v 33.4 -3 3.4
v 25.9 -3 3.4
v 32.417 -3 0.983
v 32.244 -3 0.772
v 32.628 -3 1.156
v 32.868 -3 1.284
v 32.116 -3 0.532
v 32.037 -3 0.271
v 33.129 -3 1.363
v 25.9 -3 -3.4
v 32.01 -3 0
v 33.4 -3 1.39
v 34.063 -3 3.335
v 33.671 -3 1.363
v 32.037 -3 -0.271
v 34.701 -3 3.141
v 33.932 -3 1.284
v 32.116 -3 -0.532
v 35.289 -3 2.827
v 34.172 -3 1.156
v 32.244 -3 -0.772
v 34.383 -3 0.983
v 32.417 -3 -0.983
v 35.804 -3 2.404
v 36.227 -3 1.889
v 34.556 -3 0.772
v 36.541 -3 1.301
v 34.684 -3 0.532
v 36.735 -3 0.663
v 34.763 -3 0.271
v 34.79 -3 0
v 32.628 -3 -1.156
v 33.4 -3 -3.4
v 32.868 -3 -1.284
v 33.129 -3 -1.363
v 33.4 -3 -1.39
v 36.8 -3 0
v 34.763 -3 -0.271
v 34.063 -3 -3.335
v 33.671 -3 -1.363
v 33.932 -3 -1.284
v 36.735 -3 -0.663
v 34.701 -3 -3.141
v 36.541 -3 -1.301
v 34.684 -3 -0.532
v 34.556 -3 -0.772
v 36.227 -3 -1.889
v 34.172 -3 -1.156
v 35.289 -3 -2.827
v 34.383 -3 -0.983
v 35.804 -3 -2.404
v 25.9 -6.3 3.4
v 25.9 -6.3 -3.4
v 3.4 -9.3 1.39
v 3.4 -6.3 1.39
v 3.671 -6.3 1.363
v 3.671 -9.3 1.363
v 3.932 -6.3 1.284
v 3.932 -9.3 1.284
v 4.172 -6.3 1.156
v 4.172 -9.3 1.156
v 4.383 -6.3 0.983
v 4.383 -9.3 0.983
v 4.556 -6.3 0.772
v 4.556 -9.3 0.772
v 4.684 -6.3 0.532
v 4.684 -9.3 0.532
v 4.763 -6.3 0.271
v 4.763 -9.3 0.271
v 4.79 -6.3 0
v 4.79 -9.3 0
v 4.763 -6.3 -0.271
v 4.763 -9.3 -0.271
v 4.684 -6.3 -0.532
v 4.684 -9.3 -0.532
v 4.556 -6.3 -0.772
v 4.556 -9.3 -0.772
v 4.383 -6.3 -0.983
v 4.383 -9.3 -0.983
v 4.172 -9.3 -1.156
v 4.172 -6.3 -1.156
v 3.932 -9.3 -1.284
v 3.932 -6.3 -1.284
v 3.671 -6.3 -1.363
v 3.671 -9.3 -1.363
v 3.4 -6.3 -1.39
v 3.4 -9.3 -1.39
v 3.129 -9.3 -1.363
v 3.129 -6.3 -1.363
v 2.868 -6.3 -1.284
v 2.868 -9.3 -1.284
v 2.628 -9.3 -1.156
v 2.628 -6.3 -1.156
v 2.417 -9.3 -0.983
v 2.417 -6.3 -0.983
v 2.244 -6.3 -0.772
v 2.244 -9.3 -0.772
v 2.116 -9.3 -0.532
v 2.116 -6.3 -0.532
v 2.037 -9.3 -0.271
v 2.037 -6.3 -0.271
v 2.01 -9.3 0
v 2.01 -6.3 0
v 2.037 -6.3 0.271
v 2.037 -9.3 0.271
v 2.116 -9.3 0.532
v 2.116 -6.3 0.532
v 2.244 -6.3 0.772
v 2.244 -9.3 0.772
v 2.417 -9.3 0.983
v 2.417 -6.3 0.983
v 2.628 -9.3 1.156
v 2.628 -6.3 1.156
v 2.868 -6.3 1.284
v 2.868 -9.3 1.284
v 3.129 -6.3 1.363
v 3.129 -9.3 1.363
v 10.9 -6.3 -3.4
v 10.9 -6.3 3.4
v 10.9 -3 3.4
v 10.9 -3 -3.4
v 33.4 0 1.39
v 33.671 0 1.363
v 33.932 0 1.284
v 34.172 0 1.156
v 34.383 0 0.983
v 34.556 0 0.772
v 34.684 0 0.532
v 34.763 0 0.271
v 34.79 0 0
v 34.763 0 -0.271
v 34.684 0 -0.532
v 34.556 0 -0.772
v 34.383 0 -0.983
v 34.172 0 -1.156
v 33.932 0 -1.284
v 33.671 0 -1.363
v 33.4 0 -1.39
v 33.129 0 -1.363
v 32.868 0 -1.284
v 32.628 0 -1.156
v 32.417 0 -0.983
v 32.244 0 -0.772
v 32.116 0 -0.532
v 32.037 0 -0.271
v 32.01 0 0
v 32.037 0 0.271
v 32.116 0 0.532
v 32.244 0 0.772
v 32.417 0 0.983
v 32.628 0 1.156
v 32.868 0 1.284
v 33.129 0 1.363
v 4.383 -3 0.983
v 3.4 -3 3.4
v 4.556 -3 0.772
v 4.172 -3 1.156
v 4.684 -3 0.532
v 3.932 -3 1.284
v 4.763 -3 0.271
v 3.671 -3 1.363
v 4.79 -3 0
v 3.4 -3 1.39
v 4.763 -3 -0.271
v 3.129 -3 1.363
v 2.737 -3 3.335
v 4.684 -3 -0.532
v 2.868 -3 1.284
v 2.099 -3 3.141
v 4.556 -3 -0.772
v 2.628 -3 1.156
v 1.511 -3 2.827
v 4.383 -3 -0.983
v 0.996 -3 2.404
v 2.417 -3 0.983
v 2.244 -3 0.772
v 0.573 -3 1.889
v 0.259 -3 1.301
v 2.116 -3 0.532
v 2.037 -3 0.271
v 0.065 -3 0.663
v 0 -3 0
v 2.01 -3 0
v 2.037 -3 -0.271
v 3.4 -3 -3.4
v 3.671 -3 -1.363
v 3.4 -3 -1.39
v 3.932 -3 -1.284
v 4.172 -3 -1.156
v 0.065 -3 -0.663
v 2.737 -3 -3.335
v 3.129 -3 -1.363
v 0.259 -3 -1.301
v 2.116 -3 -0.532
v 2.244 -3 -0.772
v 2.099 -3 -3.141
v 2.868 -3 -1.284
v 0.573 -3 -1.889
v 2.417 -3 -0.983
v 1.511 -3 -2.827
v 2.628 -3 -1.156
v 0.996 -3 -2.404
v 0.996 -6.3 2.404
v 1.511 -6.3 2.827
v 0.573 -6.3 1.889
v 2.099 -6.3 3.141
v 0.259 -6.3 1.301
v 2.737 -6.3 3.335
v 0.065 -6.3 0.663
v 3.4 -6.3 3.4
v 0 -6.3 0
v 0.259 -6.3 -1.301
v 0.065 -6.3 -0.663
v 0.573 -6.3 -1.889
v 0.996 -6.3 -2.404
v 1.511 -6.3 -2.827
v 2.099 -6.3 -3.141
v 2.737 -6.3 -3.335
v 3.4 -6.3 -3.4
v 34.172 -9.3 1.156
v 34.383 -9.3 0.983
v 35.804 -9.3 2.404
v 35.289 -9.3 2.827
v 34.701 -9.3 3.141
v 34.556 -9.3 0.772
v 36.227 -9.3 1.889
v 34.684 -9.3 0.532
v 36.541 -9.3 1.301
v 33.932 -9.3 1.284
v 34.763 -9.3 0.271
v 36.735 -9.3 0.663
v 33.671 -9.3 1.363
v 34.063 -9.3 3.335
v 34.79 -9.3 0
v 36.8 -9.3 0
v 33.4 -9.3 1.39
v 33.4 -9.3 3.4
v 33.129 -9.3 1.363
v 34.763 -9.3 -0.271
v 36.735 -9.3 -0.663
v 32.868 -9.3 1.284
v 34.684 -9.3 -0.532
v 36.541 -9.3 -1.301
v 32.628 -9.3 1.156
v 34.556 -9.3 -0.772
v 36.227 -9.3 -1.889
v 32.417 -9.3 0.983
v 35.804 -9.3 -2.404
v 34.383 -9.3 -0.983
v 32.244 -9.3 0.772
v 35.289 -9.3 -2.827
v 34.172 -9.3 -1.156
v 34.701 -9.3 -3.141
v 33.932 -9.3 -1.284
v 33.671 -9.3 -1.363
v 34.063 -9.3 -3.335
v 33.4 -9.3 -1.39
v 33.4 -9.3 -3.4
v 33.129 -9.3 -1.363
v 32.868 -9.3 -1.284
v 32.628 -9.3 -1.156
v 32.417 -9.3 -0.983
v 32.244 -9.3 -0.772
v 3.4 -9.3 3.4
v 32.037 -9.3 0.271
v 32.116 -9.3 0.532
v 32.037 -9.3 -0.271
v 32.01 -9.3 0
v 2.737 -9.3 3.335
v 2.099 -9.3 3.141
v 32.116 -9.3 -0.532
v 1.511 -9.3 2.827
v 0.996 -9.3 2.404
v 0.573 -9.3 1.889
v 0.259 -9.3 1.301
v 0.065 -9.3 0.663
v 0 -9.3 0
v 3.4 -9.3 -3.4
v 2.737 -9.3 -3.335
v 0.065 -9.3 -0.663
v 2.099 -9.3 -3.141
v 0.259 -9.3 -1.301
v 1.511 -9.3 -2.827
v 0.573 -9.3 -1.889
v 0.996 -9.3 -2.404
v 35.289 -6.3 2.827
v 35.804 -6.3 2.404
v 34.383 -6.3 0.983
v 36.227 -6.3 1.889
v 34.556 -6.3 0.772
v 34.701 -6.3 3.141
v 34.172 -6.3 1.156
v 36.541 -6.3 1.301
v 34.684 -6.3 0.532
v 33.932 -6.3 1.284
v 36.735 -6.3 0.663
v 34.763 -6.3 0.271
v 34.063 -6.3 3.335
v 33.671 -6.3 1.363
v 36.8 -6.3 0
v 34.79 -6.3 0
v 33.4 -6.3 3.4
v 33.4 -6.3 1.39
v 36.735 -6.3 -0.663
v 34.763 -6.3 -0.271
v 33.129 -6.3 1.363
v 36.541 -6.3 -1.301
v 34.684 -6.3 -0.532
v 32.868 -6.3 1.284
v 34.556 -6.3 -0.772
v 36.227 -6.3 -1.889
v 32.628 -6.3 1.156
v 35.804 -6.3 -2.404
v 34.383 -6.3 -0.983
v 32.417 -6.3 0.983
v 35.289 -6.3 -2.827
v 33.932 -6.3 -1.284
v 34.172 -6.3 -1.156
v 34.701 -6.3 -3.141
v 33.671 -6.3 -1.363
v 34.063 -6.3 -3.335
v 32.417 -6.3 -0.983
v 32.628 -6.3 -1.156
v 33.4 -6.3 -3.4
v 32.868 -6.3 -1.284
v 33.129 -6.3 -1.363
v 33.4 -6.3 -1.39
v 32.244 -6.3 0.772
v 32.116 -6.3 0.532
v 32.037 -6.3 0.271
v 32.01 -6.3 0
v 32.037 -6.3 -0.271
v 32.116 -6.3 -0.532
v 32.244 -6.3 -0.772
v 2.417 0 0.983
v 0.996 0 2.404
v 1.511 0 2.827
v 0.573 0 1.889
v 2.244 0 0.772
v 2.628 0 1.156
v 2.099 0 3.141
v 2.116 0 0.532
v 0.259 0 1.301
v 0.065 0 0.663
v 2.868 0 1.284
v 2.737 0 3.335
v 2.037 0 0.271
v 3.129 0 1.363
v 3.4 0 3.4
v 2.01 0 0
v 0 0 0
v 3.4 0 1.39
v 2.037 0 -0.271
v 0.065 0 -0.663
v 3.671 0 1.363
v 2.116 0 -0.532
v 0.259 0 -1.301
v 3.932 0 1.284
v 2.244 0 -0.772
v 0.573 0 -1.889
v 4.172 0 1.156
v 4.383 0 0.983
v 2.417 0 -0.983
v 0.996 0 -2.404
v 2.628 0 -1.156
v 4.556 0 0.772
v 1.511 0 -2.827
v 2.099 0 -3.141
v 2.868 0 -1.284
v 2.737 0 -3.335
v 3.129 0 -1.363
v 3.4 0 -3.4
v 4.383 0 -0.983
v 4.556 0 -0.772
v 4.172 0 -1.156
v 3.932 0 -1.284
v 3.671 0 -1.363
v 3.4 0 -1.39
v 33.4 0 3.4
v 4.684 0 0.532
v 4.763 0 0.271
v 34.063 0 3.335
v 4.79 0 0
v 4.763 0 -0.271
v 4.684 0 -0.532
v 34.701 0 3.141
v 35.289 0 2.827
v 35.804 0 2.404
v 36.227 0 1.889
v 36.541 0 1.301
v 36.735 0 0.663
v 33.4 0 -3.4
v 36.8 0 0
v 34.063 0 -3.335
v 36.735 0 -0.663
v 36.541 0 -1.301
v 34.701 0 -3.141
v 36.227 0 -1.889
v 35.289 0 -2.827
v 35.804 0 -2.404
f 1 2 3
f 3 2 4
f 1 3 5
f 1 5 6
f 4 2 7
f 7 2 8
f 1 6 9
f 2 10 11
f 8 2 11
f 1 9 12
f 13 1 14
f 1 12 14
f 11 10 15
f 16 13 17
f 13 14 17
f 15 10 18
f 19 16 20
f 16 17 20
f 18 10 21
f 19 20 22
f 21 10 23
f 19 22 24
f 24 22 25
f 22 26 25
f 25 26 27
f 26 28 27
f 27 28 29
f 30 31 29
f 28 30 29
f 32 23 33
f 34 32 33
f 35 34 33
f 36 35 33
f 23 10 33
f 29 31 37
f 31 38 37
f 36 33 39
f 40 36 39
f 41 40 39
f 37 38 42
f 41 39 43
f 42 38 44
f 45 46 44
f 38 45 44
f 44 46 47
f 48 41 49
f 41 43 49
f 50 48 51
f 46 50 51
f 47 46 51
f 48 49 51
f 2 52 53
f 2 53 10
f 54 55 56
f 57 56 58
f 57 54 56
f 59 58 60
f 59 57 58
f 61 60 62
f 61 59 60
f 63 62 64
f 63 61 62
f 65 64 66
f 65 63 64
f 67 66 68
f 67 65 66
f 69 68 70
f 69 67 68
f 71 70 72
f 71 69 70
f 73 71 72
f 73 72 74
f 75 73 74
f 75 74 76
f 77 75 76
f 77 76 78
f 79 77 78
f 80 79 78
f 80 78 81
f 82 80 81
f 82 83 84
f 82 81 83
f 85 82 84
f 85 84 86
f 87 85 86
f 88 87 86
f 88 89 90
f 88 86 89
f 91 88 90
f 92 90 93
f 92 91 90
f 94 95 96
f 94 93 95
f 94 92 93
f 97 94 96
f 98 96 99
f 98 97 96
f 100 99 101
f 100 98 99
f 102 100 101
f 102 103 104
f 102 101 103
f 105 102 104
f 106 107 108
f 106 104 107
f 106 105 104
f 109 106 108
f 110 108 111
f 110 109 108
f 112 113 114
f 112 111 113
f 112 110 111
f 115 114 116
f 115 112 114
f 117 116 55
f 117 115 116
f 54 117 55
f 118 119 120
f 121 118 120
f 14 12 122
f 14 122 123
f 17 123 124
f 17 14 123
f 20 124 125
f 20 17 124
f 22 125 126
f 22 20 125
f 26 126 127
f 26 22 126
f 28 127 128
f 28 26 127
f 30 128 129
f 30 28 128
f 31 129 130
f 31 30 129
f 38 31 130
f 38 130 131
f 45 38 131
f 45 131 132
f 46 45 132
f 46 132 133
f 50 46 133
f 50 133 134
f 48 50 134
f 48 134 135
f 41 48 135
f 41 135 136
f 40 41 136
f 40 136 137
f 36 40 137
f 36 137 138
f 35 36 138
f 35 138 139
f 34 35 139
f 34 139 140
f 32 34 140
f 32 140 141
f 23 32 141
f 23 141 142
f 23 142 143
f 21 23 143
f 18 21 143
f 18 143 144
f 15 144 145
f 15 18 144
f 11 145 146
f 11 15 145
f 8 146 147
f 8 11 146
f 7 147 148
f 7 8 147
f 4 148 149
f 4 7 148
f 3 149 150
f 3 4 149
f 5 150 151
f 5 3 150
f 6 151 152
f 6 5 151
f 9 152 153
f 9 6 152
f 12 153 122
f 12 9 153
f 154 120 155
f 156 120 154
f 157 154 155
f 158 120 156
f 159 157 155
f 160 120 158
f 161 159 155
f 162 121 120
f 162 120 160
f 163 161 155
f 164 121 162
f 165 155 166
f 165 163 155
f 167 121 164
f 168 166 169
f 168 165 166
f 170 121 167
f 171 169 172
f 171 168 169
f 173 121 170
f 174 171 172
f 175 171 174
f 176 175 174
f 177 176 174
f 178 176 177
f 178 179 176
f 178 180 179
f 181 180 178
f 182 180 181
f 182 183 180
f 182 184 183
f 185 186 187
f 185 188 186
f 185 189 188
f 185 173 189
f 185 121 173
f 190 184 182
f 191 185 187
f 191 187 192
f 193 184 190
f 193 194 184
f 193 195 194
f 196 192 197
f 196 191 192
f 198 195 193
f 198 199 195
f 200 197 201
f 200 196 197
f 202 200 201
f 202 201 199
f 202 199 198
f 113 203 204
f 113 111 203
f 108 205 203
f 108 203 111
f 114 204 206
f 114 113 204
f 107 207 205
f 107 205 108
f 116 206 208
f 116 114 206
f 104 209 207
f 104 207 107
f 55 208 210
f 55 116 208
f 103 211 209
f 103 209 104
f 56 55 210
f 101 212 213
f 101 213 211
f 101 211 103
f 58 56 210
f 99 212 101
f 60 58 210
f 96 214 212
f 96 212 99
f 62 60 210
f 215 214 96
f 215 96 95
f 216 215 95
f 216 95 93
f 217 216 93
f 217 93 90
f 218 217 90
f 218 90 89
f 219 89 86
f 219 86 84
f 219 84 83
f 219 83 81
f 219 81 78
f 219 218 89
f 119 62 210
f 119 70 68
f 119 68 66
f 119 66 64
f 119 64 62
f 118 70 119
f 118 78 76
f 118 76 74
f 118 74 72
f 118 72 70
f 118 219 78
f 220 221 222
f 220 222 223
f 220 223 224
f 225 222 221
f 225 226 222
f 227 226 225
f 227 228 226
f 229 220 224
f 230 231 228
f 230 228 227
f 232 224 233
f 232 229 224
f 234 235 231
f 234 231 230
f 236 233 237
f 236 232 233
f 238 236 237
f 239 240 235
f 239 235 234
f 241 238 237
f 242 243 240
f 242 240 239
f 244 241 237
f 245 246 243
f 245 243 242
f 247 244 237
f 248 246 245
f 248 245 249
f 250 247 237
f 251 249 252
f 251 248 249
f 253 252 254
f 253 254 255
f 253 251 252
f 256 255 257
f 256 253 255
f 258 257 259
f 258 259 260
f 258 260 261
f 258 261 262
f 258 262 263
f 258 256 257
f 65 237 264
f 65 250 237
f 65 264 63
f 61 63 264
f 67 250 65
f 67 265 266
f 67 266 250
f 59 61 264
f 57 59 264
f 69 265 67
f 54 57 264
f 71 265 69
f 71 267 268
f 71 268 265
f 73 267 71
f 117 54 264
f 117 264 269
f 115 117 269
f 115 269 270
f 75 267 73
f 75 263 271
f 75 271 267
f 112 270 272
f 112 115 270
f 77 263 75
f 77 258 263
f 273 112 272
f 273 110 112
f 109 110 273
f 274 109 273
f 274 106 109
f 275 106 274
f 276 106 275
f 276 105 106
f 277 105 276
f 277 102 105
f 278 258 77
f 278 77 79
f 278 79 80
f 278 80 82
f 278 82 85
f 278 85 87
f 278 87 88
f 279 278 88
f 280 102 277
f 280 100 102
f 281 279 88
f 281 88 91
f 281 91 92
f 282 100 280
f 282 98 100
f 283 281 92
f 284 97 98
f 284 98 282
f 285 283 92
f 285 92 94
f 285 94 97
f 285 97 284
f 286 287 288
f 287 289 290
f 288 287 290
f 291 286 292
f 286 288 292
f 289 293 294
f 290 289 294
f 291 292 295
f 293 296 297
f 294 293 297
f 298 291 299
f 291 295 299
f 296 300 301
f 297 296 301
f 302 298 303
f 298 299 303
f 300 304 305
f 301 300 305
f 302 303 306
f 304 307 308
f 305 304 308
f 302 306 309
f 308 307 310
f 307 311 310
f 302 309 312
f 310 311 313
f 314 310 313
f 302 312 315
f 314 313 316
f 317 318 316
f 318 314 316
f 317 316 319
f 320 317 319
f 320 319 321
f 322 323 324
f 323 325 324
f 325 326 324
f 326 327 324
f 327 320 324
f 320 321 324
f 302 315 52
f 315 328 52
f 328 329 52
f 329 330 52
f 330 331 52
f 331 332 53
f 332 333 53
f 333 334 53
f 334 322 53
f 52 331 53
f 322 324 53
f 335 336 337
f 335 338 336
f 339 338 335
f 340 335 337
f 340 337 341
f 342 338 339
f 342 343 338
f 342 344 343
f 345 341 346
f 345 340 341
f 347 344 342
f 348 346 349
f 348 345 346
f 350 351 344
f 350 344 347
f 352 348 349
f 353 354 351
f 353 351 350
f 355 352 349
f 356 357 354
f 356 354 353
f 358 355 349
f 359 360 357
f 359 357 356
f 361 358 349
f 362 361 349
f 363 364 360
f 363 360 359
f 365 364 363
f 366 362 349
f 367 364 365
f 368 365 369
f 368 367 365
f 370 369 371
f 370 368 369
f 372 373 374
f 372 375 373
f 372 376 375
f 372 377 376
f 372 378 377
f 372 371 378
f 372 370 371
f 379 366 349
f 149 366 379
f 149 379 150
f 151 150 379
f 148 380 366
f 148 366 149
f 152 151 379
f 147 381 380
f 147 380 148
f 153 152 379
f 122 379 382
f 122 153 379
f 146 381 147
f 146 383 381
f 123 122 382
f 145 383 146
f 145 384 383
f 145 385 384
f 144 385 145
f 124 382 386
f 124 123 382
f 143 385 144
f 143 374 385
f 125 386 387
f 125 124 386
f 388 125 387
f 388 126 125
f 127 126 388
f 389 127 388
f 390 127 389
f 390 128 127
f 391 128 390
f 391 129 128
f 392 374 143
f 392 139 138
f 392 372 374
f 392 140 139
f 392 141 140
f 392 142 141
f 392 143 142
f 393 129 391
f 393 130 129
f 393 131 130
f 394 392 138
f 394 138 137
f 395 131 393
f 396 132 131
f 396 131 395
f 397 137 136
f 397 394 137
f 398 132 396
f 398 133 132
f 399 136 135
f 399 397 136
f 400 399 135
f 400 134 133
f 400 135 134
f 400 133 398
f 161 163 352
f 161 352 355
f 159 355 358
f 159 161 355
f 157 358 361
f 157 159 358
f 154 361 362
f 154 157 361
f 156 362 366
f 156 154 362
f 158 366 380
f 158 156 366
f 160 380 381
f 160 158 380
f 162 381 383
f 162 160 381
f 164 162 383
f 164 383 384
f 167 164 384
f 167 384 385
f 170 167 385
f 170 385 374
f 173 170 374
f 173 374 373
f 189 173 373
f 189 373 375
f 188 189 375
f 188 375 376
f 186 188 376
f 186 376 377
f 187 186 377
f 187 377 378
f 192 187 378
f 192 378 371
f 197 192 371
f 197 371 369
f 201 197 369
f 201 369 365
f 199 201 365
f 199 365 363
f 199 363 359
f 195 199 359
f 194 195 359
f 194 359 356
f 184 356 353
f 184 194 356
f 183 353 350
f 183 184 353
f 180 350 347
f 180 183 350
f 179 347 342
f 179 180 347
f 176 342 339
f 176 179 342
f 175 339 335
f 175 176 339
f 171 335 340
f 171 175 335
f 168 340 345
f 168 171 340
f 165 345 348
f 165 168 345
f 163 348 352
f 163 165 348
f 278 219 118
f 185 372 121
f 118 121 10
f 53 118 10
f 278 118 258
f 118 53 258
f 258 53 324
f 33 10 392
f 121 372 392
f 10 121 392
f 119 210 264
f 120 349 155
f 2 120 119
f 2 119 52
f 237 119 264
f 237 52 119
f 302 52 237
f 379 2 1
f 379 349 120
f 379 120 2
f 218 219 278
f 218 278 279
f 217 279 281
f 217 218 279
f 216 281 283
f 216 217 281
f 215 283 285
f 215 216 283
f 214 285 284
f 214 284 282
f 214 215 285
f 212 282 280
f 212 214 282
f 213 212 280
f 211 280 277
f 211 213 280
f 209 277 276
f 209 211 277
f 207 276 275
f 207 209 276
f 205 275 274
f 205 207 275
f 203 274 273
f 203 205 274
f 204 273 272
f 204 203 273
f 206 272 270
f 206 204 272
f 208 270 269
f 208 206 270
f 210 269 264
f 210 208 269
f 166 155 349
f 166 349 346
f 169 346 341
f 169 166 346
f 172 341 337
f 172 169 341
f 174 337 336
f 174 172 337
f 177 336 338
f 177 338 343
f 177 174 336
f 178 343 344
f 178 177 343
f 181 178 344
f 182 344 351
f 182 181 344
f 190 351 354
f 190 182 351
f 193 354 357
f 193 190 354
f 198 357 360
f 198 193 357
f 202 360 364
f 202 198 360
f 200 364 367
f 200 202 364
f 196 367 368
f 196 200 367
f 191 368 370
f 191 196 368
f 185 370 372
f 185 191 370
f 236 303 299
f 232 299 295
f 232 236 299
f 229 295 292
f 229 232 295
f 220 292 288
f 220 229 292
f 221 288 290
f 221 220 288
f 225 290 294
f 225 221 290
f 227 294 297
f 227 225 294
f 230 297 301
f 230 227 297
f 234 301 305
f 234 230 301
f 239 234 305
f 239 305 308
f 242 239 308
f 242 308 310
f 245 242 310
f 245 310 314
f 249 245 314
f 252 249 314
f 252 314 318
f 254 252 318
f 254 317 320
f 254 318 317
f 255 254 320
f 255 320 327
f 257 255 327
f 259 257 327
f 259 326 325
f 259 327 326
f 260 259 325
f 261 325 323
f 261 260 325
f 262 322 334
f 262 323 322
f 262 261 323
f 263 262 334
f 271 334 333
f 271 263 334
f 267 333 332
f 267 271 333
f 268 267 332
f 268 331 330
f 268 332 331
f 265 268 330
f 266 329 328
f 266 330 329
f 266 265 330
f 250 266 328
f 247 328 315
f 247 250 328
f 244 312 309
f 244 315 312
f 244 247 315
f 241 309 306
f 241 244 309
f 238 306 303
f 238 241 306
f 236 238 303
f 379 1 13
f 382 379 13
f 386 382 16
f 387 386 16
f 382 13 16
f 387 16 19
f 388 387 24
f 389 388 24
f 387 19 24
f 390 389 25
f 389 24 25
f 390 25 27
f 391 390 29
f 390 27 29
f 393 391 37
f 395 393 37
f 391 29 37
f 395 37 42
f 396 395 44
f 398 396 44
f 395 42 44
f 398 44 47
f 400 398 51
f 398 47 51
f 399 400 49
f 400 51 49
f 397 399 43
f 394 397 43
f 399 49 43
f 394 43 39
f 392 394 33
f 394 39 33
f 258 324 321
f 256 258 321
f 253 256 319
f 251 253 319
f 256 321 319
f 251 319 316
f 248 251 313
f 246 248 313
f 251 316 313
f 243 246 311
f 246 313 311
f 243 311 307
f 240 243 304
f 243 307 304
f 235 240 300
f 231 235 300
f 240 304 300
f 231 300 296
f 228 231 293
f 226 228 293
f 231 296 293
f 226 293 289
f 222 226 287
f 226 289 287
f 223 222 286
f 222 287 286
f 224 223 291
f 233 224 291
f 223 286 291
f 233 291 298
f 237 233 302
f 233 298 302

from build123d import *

# Parameters (mm, degrees)
BOSS_EXTRUDE2_DEPTH      = 3.4
BOSS_EXTRUDE2_DEPTH_BACK = 3.4
SKETCH1_W                = 29.999999097
SKETCH1_H                = 9.300000034
SKETCH3_W                = 7.5
SKETCH3_H                = 3.300000034
CUT_EXTRUDE1_DEPTH       = 6.8
SKETCH4_W                = 7.5
SKETCH4_H                = 3.300000034
CUT_EXTRUDE2_DEPTH       = 6.8
BOSS_EXTRUDE3_START      = -3
BOSS_EXTRUDE3_DEPTH      = 3
BOSS_EXTRUDE4_START      = -3
BOSS_EXTRUDE4_DEPTH      = 3
BOSS_EXTRUDE5_START      = -3
BOSS_EXTRUDE5_DEPTH      = 3
BOSS_EXTRUDE6_START      = -3
BOSS_EXTRUDE6_DEPTH      = 3
CUT_EXTRUDE3_START       = -9.3
SKETCH9_R                = 1.39
CUT_EXTRUDE3_DEPTH       = 9.3
CUT_EXTRUDE4_START       = -9.3
SKETCH10_R               = 1.39
CUT_EXTRUDE4_DEPTH       = 9.3


with BuildPart() as part:
    # Sketch1 → Boss-Extrude2 (new, two sides: drawn at the far end of the back side and taken through both)
    with BuildSketch(Plane.XY.offset(-BOSS_EXTRUDE2_DEPTH_BACK)):
        with Locations((18.399999593, -4.650000017)):
            Rectangle(SKETCH1_W, SKETCH1_H)
    extrude(amount=BOSS_EXTRUDE2_DEPTH + BOSS_EXTRUDE2_DEPTH_BACK)

    # Sketch3 → Cut-Extrude1 (cut)
    with BuildSketch(Plane.XY.offset(3.4)):
        with Locations((7.150000045, -4.650000017)):
            Rectangle(SKETCH3_W, SKETCH3_H)
    extrude(amount=-CUT_EXTRUDE1_DEPTH, mode=Mode.SUBTRACT)

    # Sketch4 → Cut-Extrude2 (cut)
    with BuildSketch(Plane.XY.offset(3.4)):
        with Locations((29.649999142, -4.650000017)):
            Rectangle(SKETCH4_W, SKETCH4_H)
    extrude(amount=-CUT_EXTRUDE2_DEPTH, mode=Mode.SUBTRACT)

    # Sketch5 → Boss-Extrude3 (add)
    with BuildSketch(Plane(origin=(0, 0, 0), x_dir=(1, 0, 0), z_dir=(0, 1, 0)).offset(BOSS_EXTRUDE3_START)):
        with BuildLine():
            Line((3.400000045, 3.4), (3.400000045, -3.4))
            ThreePointArc((3.400000045, -3.4), (4.5e-08, 0), (3.400000045, 3.4))
        make_face()
    extrude(amount=BOSS_EXTRUDE3_DEPTH)

    # Sketch6 → Boss-Extrude4 (add)
    with BuildSketch(Plane(origin=(0, 0, 0), x_dir=(1, 0, 0), z_dir=(0, 1, 0)).offset(BOSS_EXTRUDE4_START)):
        with BuildLine():
            Line((33.399999142, 3.4), (33.399999142, -3.4))
            ThreePointArc((33.399999142, -3.4), (36.799999142, 0), (33.399999142, 3.4))
        make_face()
    extrude(amount=BOSS_EXTRUDE4_DEPTH)

    # Sketch7 → Boss-Extrude5 (add)
    with BuildSketch(Plane(origin=(0, -9.300000034, 0), x_dir=(-1, 0, 0), z_dir=(0, -1, 0)).offset(BOSS_EXTRUDE5_START)):
        with BuildLine():
            Line((-3.400000045, -3.4), (-3.400000045, 3.4))
            ThreePointArc((-3.400000045, 3.4), (-4.5e-08, 0), (-3.400000045, -3.4))
        make_face()
    extrude(amount=BOSS_EXTRUDE5_DEPTH)

    # Sketch8 → Boss-Extrude6 (add)
    with BuildSketch(Plane(origin=(0, -9.300000034, 0), x_dir=(-1, 0, 0), z_dir=(0, -1, 0)).offset(BOSS_EXTRUDE6_START)):
        with BuildLine():
            Line((-33.399999142, -3.4), (-33.399999142, 3.4))
            ThreePointArc((-33.399999142, 3.4), (-36.799999142, 0), (-33.399999142, -3.4))
        make_face()
    extrude(amount=BOSS_EXTRUDE6_DEPTH)

    # Sketch9 → Cut-Extrude3 (cut)
    with BuildSketch(Plane(origin=(0, 0, 0), x_dir=(1, 0, 0), z_dir=(0, 1, 0)).offset(CUT_EXTRUDE3_START)):
        with Locations(Location((3.400000045, 0, 0), (0, 0, 270))):
            Circle(SKETCH9_R)
    extrude(amount=CUT_EXTRUDE3_DEPTH, mode=Mode.SUBTRACT)

    # Sketch10 → Cut-Extrude4 (cut)
    with BuildSketch(Plane(origin=(0, 0, 0), x_dir=(1, 0, 0), z_dir=(0, 1, 0)).offset(CUT_EXTRUDE4_START)):
        with Locations(Location((33.399999142, 0, 0), (0, 0, 270))):
            Circle(SKETCH10_R)
    extrude(amount=CUT_EXTRUDE4_DEPTH, mode=Mode.SUBTRACT)


solid = part.part
